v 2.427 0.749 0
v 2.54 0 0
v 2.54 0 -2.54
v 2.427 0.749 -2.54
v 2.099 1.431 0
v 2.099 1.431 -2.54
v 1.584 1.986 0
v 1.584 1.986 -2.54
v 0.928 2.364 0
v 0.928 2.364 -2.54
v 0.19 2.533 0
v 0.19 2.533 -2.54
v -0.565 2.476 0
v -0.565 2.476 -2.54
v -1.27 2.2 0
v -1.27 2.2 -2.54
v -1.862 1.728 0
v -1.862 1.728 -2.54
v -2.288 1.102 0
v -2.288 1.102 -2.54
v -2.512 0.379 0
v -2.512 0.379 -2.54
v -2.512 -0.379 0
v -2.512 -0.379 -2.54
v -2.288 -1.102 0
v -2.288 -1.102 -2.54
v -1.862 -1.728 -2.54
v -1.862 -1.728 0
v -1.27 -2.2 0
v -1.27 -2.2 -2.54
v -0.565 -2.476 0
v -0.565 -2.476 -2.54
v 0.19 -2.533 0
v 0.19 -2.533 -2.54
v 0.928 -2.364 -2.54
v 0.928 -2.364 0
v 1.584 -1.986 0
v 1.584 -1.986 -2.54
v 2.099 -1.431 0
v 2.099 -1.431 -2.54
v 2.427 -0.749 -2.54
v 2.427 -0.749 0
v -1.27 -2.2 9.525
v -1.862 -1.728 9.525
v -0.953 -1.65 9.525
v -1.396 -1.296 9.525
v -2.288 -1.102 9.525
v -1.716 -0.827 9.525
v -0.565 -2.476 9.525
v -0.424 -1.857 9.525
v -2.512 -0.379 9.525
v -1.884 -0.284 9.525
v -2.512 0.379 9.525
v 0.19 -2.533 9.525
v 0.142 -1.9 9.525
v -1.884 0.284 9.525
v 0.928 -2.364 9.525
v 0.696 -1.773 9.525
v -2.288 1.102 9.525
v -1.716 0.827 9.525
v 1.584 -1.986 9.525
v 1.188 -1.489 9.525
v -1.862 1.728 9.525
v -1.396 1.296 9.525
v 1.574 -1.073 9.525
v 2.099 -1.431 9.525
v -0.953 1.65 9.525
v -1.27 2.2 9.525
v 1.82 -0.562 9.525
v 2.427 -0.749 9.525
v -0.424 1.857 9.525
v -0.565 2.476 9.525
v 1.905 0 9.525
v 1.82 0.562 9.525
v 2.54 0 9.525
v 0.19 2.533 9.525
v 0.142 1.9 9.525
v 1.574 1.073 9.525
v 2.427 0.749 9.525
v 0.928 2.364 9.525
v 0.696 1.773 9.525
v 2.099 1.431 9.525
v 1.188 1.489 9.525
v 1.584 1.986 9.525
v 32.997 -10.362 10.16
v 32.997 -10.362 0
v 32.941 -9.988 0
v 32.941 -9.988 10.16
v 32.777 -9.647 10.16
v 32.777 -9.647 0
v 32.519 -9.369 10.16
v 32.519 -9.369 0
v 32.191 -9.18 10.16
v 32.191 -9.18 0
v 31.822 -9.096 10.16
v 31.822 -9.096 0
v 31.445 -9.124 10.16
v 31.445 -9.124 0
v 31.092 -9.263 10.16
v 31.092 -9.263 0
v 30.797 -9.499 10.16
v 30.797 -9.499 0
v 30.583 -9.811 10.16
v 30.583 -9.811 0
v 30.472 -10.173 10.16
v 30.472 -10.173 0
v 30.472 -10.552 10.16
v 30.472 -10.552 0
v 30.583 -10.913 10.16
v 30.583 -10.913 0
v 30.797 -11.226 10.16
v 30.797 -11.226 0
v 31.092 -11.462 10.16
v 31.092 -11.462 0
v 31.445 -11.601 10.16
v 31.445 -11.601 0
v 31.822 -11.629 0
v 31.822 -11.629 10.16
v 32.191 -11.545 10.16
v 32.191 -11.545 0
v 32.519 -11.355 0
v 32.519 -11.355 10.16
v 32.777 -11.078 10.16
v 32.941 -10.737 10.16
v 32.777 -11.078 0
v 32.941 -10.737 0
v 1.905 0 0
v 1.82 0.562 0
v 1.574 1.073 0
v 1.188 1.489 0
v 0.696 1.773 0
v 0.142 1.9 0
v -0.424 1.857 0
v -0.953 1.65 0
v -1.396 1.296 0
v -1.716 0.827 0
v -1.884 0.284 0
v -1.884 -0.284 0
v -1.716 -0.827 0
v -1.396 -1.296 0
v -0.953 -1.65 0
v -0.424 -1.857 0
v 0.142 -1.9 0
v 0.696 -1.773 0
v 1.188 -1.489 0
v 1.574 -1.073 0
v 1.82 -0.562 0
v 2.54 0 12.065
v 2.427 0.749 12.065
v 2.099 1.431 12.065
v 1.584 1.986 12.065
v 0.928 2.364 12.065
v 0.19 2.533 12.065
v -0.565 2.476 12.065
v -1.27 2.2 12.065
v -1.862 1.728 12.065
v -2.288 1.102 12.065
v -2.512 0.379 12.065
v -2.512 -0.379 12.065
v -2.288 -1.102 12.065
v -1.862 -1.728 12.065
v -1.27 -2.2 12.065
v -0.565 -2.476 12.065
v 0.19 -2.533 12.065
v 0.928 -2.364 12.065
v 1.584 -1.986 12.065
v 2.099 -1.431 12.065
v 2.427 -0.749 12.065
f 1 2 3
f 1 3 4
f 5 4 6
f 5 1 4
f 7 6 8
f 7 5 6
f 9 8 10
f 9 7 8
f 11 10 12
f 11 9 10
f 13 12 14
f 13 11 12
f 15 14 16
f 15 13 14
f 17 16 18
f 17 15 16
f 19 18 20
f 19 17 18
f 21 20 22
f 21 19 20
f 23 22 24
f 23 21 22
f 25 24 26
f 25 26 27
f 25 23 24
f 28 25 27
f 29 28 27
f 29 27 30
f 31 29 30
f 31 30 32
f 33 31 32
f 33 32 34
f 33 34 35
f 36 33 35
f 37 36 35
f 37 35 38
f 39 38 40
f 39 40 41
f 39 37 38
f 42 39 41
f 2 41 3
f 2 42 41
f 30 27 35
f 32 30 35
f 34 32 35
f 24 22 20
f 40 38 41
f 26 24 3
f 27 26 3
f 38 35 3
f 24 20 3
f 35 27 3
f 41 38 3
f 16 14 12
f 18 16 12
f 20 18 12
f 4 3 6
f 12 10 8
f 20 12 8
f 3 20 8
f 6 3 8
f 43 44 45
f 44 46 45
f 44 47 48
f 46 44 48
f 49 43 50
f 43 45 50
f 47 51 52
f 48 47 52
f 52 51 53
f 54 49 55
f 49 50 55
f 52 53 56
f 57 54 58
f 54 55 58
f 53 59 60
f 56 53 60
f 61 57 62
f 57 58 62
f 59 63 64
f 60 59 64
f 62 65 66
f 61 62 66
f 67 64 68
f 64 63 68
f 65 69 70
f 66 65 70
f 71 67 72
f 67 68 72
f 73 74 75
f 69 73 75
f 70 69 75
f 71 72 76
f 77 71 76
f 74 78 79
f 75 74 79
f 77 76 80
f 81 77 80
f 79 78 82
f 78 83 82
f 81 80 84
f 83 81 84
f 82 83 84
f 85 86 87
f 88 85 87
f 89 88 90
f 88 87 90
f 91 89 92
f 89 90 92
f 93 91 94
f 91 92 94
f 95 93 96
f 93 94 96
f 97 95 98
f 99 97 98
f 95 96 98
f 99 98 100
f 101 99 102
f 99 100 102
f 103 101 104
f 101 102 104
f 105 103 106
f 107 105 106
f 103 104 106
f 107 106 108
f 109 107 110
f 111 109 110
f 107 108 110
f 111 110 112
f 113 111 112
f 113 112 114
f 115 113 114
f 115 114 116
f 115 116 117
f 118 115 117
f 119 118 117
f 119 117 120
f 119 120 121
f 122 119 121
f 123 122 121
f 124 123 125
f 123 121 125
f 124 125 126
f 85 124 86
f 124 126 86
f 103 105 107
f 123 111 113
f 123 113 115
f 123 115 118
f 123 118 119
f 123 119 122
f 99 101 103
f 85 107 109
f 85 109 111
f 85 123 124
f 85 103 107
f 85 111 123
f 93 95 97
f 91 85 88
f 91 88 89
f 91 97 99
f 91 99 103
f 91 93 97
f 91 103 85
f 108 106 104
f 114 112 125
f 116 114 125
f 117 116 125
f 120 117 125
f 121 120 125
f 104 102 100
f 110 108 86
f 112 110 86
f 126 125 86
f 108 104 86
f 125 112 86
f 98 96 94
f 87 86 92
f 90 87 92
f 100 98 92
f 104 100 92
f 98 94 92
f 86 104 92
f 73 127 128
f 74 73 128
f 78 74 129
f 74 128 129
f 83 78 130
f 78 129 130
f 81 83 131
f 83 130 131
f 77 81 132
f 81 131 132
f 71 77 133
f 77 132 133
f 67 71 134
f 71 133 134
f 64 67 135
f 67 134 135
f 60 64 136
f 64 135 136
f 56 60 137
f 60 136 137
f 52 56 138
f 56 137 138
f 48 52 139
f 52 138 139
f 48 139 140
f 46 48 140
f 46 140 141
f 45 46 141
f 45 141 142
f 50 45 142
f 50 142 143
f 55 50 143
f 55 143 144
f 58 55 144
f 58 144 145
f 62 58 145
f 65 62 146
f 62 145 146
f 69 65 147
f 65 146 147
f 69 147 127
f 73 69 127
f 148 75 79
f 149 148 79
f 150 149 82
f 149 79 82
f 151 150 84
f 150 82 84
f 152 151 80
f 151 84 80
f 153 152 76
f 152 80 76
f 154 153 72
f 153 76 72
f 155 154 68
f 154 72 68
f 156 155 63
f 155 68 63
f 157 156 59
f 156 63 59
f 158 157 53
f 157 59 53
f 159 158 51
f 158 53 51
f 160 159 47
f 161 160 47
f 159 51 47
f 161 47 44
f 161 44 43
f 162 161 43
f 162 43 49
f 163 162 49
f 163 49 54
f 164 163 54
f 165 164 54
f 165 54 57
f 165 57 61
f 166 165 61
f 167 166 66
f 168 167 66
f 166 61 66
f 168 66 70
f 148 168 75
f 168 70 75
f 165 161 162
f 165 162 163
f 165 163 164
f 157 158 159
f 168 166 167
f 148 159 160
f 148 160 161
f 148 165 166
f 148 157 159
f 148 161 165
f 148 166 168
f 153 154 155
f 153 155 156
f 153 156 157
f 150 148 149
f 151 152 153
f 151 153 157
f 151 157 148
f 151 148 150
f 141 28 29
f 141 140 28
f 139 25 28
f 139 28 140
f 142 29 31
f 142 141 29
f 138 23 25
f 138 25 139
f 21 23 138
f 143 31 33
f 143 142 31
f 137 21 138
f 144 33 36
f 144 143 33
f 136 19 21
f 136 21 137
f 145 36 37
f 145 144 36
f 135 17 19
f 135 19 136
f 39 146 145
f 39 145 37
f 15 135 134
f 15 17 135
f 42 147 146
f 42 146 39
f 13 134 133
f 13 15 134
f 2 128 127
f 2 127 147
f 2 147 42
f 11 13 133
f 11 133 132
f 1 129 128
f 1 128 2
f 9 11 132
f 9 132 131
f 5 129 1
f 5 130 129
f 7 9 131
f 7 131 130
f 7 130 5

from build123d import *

# Parameters (mm, degrees)
F0_R     = 2.54
F0_R_2   = 1.905
F1_DEPTH = 2.54
F2_DEPTH = 9.525
F3_R     = 2.54
F4_DEPTH = 2.54
F5_R     = 1.27
F6_DEPTH = 10.16


with BuildPart() as f1:
    # F0 (on Top) → F1 (new body)
    with BuildSketch(Plane.XY):
        Circle(F0_R)
        Circle(F0_R_2, mode=Mode.SUBTRACT)
        Circle(F0_R_2)
    extrude(amount=-F1_DEPTH)

    # F0 (on Top) → F2 (join)
    with BuildSketch(Plane.XY):
        Circle(F0_R_2)
    extrude(amount=F2_DEPTH)

    # F3 (on face) → F4 (join)
    with BuildSketch(Plane.XY.offset(9.525)):
        Circle(F3_R)
    extrude(amount=F4_DEPTH)


with BuildPart() as f6:
    # F5 (on Top) → F6 (new body)
    with BuildSketch(Plane.XY):
        with Locations((31.7274779081, -10.3624220937)):
            Circle(F5_R)
    extrude(amount=F6_DEPTH)


solid = Compound([f1.part, f6.part])
